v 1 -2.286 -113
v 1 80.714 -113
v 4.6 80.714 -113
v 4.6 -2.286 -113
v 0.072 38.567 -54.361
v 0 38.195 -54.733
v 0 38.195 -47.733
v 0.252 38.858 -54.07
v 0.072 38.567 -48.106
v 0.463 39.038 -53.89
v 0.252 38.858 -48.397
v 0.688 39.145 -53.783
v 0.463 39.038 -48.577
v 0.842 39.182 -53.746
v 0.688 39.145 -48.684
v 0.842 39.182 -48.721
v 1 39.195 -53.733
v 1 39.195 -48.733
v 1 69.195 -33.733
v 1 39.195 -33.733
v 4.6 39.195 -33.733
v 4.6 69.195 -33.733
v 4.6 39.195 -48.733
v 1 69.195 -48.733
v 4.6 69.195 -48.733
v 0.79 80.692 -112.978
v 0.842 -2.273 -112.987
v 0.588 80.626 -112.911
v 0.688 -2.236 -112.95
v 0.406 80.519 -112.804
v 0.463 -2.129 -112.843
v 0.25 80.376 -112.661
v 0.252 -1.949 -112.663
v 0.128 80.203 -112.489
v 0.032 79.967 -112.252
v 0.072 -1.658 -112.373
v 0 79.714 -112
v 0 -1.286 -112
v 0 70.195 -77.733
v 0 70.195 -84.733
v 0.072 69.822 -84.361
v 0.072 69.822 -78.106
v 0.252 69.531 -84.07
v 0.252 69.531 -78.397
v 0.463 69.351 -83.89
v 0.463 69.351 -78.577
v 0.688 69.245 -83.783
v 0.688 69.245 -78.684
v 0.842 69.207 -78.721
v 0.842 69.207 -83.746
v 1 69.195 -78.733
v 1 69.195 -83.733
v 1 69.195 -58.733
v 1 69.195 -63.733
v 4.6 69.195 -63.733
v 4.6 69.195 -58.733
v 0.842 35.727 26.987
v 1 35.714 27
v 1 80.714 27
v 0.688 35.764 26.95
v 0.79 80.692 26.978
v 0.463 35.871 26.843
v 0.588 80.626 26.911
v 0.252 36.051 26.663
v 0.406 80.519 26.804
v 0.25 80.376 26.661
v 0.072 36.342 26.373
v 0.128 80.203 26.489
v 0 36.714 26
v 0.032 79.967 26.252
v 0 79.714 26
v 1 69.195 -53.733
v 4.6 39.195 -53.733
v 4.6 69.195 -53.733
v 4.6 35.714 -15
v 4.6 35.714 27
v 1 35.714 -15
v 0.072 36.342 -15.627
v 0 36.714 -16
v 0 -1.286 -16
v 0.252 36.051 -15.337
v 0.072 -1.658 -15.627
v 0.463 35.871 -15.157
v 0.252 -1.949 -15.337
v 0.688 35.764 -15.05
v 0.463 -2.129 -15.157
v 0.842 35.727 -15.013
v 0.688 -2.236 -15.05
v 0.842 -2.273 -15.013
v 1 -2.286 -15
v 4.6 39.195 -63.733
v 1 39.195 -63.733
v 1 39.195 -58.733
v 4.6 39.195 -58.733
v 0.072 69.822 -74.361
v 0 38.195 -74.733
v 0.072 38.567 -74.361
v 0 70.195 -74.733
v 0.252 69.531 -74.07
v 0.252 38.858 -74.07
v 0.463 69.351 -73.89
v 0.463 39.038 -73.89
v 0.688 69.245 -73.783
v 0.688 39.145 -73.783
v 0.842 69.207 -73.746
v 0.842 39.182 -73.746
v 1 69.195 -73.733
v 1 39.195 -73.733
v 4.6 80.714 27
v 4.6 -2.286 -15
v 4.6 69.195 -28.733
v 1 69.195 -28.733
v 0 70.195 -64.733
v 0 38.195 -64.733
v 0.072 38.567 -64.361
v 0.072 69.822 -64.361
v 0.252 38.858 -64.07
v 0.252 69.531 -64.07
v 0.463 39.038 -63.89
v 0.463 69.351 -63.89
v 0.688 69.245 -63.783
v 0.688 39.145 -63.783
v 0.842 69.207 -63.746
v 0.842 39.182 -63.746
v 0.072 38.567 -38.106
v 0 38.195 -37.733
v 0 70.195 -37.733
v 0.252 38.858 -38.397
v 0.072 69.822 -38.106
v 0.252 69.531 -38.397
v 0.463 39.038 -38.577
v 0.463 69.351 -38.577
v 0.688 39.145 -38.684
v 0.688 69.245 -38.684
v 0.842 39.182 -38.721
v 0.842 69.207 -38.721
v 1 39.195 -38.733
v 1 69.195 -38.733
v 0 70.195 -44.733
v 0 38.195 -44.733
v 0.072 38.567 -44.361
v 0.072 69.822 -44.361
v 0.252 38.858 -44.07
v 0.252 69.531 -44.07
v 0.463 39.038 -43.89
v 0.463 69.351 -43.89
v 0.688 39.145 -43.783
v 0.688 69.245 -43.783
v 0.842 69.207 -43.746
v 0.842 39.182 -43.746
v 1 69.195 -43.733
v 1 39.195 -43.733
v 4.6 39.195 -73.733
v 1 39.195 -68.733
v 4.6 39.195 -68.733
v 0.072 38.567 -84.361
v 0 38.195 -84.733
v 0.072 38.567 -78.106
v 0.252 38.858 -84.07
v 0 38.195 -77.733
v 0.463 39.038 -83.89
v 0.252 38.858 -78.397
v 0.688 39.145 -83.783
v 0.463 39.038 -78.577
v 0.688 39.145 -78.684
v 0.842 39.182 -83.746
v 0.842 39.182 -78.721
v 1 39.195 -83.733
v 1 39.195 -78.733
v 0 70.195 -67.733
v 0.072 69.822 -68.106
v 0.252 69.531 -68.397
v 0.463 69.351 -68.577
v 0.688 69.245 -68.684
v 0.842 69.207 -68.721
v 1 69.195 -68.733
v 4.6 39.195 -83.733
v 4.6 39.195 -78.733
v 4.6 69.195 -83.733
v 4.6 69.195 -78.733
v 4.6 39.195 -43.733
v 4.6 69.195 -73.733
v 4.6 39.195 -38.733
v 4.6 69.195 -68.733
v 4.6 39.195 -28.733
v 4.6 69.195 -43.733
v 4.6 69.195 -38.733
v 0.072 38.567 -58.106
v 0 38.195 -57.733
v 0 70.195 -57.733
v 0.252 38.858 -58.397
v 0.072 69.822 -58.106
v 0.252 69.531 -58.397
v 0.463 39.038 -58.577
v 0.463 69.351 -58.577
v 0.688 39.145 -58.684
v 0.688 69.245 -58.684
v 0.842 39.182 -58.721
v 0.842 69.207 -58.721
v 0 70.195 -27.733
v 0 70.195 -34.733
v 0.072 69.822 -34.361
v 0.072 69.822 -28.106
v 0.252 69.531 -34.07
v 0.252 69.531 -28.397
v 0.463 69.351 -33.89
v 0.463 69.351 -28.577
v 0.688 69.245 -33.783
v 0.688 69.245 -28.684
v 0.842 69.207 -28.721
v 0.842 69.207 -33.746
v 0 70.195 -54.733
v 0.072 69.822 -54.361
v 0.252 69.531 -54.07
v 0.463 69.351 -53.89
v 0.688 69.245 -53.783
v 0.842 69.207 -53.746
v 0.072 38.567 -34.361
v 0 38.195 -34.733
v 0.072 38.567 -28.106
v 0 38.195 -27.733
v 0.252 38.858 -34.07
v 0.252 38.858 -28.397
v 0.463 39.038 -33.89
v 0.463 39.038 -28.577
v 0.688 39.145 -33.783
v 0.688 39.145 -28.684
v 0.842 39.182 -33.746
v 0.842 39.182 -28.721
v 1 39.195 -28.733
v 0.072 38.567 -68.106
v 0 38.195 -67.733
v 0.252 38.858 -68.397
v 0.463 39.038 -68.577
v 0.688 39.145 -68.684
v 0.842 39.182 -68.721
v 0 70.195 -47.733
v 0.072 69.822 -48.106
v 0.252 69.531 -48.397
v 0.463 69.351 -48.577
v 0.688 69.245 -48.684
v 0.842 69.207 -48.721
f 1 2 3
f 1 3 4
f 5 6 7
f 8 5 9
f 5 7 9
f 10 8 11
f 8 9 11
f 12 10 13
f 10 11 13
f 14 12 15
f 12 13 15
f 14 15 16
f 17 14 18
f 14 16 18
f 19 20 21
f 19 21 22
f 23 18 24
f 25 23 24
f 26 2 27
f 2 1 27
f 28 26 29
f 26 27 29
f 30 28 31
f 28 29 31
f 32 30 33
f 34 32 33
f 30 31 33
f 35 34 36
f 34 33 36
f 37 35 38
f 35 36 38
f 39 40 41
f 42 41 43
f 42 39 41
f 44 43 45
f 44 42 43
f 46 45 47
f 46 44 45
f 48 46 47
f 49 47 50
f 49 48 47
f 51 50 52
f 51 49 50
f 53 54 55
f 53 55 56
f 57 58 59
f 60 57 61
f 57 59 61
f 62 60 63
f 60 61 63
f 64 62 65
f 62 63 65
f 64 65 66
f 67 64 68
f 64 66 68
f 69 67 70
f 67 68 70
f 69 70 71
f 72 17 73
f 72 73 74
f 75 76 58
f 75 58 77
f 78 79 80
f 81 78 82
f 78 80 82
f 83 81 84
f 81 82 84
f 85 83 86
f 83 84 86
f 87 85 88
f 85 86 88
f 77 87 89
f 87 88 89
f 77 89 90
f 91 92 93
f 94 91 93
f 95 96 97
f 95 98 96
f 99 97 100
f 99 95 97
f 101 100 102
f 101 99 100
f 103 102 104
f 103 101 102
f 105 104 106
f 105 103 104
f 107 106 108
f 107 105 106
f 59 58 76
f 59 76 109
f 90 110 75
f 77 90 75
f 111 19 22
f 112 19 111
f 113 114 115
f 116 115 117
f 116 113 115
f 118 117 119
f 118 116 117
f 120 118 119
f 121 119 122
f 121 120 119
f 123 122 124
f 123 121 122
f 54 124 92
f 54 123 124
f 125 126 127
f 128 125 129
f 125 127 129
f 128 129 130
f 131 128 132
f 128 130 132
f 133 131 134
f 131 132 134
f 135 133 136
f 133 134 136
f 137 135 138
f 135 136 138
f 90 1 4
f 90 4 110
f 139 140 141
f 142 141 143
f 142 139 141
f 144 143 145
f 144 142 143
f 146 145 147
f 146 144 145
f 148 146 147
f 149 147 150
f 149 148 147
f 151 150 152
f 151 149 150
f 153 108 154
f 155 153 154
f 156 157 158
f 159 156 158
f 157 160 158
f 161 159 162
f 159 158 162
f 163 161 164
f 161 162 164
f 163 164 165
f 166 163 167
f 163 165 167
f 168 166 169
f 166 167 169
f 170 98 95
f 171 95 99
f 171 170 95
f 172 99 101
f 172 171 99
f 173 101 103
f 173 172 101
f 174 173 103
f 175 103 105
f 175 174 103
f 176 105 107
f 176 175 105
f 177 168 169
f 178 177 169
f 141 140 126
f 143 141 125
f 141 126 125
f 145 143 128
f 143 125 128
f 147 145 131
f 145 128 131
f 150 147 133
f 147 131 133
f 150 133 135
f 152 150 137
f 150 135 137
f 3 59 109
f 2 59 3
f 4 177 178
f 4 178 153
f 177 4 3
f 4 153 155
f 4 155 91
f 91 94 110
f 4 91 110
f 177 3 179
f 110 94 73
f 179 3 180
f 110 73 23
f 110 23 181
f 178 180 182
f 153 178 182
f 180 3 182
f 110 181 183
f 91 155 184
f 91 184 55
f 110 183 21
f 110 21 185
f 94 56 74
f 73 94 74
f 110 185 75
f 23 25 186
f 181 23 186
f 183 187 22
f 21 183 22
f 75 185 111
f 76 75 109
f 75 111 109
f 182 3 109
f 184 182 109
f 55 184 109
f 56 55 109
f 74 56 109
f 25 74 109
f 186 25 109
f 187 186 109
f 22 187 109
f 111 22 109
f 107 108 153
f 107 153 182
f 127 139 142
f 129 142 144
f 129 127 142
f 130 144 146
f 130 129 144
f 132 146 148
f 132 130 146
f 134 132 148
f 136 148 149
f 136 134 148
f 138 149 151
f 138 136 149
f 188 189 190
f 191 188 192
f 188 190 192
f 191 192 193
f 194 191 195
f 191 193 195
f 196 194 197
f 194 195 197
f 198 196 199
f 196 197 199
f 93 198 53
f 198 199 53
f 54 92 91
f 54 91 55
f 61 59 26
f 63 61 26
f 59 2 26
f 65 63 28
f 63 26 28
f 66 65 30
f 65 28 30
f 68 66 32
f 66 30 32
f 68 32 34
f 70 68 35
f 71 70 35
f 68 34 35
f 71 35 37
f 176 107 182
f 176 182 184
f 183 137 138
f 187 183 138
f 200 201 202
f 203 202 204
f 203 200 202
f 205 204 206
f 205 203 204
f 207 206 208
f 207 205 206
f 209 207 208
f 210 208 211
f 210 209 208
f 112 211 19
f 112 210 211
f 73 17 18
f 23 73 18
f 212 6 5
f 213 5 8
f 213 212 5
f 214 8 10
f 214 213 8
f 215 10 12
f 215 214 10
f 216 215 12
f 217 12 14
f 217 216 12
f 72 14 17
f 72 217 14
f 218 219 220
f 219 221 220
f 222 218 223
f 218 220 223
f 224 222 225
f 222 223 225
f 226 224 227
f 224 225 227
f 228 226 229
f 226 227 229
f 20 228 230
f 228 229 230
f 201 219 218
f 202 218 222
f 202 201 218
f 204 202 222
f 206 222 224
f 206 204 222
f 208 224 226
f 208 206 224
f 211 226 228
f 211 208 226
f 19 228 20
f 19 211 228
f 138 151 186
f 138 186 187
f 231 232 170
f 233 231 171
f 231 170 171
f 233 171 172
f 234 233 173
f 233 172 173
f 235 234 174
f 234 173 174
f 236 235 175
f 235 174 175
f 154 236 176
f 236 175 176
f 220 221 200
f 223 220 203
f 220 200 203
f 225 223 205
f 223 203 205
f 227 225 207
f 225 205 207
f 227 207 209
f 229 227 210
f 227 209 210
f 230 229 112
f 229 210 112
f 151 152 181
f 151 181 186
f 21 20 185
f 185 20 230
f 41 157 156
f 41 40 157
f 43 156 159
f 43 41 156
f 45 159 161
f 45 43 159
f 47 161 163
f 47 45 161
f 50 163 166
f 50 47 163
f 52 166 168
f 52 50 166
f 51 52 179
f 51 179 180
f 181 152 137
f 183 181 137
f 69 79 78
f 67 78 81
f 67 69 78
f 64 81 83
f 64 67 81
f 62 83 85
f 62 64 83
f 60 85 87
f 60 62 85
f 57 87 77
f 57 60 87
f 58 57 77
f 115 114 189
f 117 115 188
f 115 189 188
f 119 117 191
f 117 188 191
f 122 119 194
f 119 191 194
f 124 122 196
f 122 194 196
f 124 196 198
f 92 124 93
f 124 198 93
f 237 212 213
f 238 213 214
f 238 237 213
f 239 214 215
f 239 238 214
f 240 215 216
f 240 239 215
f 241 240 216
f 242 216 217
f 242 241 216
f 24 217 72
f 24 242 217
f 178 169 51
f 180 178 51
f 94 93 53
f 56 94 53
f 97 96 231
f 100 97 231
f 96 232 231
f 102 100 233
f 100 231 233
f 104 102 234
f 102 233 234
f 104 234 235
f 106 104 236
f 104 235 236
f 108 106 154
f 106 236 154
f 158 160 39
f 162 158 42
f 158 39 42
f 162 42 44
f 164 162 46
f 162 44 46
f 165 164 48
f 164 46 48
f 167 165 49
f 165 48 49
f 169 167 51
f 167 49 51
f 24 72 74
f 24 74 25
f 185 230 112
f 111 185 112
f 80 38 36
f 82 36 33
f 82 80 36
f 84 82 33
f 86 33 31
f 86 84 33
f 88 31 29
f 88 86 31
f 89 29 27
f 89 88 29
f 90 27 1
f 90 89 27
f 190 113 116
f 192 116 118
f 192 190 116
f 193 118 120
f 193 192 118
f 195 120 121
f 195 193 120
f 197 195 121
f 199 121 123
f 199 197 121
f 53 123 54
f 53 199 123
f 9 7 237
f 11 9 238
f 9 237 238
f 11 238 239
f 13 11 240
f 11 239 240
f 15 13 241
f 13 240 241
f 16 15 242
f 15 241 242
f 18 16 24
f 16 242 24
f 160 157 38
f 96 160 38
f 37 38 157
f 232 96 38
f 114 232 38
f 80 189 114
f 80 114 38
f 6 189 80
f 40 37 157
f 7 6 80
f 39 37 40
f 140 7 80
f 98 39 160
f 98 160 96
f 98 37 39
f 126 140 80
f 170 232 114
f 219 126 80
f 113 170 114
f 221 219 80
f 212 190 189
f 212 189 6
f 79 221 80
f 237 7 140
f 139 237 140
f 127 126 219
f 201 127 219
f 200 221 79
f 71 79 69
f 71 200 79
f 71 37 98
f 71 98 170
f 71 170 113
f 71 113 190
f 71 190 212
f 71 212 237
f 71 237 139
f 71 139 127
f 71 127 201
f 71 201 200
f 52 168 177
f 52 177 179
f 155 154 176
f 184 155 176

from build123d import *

# Parameters (mm, degrees)
BOSS_EXTRUDE1_DEPTH = 4.6
SKETCH2_W           = 42
SKETCH2_H           = 55
CUT_EXTRUDE1_DEPTH  = 139.94227549
SKETCH4_W           = 5
SKETCH4_H           = 30
CUT_EXTRUDE3_DEPTH  = 10
FILLET1_R           = 1


with BuildPart() as part:
    # Sketch1 → Boss-Extrude1 (new body)
    with BuildSketch(Plane(origin=(0, 0, 0), x_dir=(0, 0, -1), z_dir=(1, 0, 0))):
        Polygon((-27, 80.714285714), (113, 80.714285714), (113, -2.285714286), (13, -2.285714286), (13, -19.285714286), (-27, -19.285714286), align=None)
    extrude(amount=BOSS_EXTRUDE1_DEPTH)

    # Sketch2 → Cut-Extrude1 (cut, through all)
    with BuildSketch(Plane(origin=(4.6, 0, 0), x_dir=(0, 0, -1), z_dir=(1, 0, 0))):
        with Locations((-6, 8.214285714)):
            Rectangle(SKETCH2_W, SKETCH2_H)
    extrude(amount=-CUT_EXTRUDE1_DEPTH, mode=Mode.SUBTRACT)

    # Sketch4 → Cut-Extrude3 (cut)
    with BuildSketch(Plane.ZY):
        with Locations((-41.233318098, 54.194727162)):
            Rectangle(SKETCH4_W, SKETCH4_H)
        with Locations((-31.233318098, 54.194727162)):
            Rectangle(SKETCH4_W, SKETCH4_H)
        with Locations((-51.233318098, 54.194727162)):
            Rectangle(SKETCH4_W, SKETCH4_H)
        with Locations((-61.233318098, 54.194727162)):
            Rectangle(SKETCH4_W, SKETCH4_H)
        with Locations((-71.233318098, 54.194727162)):
            Rectangle(SKETCH4_W, SKETCH4_H)
        with Locations((-81.233318098, 54.194727162)):
            Rectangle(SKETCH4_W, SKETCH4_H)
    extrude(amount=-CUT_EXTRUDE3_DEPTH, mode=Mode.SUBTRACT)

    # Fillet1
    fillet1_edges = [part.edges().sort_by_distance(p)[0] for p in [
        (0, 39.194727162, -71.233318098),
        (0, 54.194727162, -68.733318098),
        (0, 69.194727162, -71.233318098),
        (0, 54.194727162, -73.733318098),
        (0, 39.194727162, -81.233318098),
        (0, 54.194727162, -78.733318098),
        (0, 69.194727162, -81.233318098),
        (0, 54.194727162, -83.733318098),
        (0, -2.285714286, -64),
        (0, 16.714285714, -15),
        (0, 35.714285714, 6),
        (0, 80.714285714, -43),
        (0, 39.214285714, -113),
        (0, 54.194727162, -28.733318098),
        (0, 69.194727162, -31.233318098),
        (0, 54.194727162, -33.733318098),
        (0, 39.194727162, -31.233318098),
        (0, 39.194727162, -41.233318098),
        (0, 54.194727162, -38.733318098),
        (0, 69.194727162, -41.233318098),
        (0, 54.194727162, -43.733318098),
        (0, 58.214285714, 27),
        (0, 39.194727162, -51.233318098),
        (0, 54.194727162, -48.733318098),
        (0, 69.194727162, -51.233318098),
        (0, 54.194727162, -53.733318098),
        (0, 39.194727162, -61.233318098),
        (0, 54.194727162, -58.733318098),
        (0, 69.194727162, -61.233318098),
        (0, 54.194727162, -63.733318098),
    ]]
    fillet(fillet1_edges, radius=FILLET1_R)


solid = part.part
